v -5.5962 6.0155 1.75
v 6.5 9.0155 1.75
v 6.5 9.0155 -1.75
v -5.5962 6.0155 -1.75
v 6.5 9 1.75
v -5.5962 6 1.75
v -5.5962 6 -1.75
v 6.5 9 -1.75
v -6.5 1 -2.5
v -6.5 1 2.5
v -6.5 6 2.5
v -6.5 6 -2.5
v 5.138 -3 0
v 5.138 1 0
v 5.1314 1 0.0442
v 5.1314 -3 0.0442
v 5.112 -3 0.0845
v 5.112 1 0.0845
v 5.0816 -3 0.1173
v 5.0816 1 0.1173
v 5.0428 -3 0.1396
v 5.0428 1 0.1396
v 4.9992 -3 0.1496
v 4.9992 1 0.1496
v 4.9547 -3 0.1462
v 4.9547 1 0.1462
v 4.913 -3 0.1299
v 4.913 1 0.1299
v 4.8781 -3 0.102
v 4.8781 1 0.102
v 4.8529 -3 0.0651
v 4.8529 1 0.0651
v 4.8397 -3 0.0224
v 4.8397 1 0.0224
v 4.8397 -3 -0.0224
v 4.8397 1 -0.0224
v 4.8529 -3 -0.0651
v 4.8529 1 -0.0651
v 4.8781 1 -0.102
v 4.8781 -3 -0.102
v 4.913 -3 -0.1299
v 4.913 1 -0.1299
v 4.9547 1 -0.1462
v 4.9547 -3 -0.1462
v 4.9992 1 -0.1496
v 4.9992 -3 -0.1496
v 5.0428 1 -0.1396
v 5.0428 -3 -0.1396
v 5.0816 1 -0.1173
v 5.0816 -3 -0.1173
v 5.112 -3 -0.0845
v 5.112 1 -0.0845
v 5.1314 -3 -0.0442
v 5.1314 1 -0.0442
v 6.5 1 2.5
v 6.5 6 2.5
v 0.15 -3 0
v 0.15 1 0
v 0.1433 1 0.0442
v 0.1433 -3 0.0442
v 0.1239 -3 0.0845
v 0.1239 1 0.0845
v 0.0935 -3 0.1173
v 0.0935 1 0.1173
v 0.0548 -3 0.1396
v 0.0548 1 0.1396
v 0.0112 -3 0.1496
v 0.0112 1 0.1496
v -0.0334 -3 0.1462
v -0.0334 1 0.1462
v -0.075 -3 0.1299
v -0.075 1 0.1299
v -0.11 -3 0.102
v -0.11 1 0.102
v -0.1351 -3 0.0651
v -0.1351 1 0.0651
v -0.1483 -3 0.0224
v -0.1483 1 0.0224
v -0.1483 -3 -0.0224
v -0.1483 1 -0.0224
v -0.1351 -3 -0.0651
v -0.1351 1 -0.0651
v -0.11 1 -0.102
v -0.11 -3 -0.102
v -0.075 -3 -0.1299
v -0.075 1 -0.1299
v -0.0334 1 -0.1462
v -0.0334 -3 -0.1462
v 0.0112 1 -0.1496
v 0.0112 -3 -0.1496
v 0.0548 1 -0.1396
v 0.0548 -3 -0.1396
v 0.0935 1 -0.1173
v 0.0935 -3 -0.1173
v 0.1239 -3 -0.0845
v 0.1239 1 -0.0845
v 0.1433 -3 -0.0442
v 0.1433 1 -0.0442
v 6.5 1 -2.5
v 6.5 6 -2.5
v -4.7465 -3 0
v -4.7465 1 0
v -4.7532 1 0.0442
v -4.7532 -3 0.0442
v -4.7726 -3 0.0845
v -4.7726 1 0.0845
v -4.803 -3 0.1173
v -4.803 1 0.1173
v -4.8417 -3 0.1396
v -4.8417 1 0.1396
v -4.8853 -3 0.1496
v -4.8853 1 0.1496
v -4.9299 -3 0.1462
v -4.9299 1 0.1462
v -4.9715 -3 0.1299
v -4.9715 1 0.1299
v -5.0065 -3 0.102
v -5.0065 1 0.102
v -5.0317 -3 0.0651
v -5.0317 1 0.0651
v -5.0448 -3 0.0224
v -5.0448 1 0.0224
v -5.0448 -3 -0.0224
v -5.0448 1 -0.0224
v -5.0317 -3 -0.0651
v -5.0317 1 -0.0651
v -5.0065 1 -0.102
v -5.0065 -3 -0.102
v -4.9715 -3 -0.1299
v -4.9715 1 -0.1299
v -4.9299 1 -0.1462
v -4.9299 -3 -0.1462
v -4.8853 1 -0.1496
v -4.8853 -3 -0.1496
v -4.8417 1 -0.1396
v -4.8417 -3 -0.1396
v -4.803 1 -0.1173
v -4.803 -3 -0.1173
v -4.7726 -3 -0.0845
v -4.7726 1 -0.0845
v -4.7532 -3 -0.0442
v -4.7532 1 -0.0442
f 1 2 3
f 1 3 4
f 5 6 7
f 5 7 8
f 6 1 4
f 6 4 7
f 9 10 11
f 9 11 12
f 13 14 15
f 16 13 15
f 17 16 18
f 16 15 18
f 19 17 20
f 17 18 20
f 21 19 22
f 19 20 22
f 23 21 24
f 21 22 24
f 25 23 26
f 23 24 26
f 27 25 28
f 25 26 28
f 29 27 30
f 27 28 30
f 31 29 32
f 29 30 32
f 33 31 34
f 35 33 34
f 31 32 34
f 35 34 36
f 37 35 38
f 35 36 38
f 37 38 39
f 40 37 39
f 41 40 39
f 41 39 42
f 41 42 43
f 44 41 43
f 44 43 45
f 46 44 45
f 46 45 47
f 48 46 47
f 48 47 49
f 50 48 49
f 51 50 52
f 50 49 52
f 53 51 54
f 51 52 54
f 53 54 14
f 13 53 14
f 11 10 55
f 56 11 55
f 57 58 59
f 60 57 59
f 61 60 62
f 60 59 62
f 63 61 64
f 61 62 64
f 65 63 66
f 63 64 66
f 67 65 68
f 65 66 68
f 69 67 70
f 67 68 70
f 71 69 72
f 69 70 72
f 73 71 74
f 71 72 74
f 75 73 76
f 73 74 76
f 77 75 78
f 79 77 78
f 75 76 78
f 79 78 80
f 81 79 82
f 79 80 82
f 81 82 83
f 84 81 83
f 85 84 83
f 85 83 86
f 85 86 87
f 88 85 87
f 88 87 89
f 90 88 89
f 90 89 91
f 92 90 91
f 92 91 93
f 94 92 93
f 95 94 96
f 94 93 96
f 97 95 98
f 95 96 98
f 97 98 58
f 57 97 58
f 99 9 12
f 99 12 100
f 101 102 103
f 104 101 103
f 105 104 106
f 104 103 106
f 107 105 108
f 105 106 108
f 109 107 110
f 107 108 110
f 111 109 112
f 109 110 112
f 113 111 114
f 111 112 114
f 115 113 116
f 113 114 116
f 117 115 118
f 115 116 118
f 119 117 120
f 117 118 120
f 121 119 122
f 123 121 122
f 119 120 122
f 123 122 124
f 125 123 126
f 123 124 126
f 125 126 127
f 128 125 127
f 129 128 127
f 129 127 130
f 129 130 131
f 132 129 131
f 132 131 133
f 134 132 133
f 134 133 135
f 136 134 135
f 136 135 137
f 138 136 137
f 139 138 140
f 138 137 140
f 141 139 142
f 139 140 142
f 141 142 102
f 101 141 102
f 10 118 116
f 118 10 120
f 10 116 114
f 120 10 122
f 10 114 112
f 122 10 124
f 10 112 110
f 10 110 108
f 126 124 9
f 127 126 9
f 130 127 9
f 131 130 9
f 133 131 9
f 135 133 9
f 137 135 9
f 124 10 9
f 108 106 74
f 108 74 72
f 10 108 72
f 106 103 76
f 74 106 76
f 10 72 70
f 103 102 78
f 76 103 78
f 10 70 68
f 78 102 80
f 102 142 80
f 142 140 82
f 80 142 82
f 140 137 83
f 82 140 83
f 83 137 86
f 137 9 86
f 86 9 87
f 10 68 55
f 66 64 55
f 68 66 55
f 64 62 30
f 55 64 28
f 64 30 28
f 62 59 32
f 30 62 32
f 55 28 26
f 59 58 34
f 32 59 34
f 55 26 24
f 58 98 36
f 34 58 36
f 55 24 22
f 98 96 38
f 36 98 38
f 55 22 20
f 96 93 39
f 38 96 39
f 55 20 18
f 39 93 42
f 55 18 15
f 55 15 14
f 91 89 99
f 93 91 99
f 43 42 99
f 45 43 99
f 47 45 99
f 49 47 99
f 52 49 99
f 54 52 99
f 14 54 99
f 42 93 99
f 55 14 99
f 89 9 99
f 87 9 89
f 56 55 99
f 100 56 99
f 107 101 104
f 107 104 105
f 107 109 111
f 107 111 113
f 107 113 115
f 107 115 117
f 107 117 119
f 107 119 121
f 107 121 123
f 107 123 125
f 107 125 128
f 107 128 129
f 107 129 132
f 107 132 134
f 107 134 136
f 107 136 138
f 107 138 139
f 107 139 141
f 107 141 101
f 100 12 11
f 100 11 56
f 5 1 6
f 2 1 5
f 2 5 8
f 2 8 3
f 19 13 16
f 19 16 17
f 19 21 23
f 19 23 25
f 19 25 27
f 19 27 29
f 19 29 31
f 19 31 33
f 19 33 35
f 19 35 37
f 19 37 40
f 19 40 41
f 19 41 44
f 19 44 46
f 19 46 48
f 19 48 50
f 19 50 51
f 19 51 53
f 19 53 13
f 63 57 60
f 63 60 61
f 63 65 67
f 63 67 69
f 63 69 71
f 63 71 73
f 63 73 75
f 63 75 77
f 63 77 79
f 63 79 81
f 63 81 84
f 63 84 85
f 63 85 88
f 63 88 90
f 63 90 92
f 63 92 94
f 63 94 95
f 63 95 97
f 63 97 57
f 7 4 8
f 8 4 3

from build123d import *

# Parameters (mm, degrees)
SALIENTE_EXTRUIR1_START = 1
CROQUIS1_W              = 13
CROQUIS1_H              = 5
SALIENTE_EXTRUIR1_DEPTH = 5
CROQUIS2_R              = 0.15
SALIENTE_EXTRUIR2_DEPTH = 4
SALIENTE_EXTRUIR3_START = -0.75
SALIENTE_EXTRUIR3_DEPTH = 3.5


with BuildPart() as part:
    # Croquis1 → Saliente-Extruir1 (new body)
    with BuildSketch(Plane(origin=(0, 0, 0), x_dir=(1, 0, 0), z_dir=(0, 1, 0)).offset(SALIENTE_EXTRUIR1_START)):
        Rectangle(CROQUIS1_W, CROQUIS1_H)
    extrude(amount=SALIENTE_EXTRUIR1_DEPTH)

    # Croquis2 → Saliente-Extruir2 (add)
    with BuildSketch(Plane.XZ.offset(-1)):
        Circle(CROQUIS2_R)
        with Locations((-4.896514092, 0)):
            Circle(CROQUIS2_R)
        with Locations((4.98803772, 0)):
            Circle(CROQUIS2_R)
    extrude(amount=SALIENTE_EXTRUIR2_DEPTH)


with BuildPart() as body_2:
    # Croquis3 → Saliente-Extruir3 (new body)
    with BuildSketch(Plane.XY.offset(2.5).offset(SALIENTE_EXTRUIR3_START)):
        Polygon((-5.596201579, 6), (6.5, 9), (6.5, 9.015531113), (-5.596201579, 6.015531113), align=None)
    extrude(amount=-SALIENTE_EXTRUIR3_DEPTH)


solid = Compound([part.part, body_2.part])
